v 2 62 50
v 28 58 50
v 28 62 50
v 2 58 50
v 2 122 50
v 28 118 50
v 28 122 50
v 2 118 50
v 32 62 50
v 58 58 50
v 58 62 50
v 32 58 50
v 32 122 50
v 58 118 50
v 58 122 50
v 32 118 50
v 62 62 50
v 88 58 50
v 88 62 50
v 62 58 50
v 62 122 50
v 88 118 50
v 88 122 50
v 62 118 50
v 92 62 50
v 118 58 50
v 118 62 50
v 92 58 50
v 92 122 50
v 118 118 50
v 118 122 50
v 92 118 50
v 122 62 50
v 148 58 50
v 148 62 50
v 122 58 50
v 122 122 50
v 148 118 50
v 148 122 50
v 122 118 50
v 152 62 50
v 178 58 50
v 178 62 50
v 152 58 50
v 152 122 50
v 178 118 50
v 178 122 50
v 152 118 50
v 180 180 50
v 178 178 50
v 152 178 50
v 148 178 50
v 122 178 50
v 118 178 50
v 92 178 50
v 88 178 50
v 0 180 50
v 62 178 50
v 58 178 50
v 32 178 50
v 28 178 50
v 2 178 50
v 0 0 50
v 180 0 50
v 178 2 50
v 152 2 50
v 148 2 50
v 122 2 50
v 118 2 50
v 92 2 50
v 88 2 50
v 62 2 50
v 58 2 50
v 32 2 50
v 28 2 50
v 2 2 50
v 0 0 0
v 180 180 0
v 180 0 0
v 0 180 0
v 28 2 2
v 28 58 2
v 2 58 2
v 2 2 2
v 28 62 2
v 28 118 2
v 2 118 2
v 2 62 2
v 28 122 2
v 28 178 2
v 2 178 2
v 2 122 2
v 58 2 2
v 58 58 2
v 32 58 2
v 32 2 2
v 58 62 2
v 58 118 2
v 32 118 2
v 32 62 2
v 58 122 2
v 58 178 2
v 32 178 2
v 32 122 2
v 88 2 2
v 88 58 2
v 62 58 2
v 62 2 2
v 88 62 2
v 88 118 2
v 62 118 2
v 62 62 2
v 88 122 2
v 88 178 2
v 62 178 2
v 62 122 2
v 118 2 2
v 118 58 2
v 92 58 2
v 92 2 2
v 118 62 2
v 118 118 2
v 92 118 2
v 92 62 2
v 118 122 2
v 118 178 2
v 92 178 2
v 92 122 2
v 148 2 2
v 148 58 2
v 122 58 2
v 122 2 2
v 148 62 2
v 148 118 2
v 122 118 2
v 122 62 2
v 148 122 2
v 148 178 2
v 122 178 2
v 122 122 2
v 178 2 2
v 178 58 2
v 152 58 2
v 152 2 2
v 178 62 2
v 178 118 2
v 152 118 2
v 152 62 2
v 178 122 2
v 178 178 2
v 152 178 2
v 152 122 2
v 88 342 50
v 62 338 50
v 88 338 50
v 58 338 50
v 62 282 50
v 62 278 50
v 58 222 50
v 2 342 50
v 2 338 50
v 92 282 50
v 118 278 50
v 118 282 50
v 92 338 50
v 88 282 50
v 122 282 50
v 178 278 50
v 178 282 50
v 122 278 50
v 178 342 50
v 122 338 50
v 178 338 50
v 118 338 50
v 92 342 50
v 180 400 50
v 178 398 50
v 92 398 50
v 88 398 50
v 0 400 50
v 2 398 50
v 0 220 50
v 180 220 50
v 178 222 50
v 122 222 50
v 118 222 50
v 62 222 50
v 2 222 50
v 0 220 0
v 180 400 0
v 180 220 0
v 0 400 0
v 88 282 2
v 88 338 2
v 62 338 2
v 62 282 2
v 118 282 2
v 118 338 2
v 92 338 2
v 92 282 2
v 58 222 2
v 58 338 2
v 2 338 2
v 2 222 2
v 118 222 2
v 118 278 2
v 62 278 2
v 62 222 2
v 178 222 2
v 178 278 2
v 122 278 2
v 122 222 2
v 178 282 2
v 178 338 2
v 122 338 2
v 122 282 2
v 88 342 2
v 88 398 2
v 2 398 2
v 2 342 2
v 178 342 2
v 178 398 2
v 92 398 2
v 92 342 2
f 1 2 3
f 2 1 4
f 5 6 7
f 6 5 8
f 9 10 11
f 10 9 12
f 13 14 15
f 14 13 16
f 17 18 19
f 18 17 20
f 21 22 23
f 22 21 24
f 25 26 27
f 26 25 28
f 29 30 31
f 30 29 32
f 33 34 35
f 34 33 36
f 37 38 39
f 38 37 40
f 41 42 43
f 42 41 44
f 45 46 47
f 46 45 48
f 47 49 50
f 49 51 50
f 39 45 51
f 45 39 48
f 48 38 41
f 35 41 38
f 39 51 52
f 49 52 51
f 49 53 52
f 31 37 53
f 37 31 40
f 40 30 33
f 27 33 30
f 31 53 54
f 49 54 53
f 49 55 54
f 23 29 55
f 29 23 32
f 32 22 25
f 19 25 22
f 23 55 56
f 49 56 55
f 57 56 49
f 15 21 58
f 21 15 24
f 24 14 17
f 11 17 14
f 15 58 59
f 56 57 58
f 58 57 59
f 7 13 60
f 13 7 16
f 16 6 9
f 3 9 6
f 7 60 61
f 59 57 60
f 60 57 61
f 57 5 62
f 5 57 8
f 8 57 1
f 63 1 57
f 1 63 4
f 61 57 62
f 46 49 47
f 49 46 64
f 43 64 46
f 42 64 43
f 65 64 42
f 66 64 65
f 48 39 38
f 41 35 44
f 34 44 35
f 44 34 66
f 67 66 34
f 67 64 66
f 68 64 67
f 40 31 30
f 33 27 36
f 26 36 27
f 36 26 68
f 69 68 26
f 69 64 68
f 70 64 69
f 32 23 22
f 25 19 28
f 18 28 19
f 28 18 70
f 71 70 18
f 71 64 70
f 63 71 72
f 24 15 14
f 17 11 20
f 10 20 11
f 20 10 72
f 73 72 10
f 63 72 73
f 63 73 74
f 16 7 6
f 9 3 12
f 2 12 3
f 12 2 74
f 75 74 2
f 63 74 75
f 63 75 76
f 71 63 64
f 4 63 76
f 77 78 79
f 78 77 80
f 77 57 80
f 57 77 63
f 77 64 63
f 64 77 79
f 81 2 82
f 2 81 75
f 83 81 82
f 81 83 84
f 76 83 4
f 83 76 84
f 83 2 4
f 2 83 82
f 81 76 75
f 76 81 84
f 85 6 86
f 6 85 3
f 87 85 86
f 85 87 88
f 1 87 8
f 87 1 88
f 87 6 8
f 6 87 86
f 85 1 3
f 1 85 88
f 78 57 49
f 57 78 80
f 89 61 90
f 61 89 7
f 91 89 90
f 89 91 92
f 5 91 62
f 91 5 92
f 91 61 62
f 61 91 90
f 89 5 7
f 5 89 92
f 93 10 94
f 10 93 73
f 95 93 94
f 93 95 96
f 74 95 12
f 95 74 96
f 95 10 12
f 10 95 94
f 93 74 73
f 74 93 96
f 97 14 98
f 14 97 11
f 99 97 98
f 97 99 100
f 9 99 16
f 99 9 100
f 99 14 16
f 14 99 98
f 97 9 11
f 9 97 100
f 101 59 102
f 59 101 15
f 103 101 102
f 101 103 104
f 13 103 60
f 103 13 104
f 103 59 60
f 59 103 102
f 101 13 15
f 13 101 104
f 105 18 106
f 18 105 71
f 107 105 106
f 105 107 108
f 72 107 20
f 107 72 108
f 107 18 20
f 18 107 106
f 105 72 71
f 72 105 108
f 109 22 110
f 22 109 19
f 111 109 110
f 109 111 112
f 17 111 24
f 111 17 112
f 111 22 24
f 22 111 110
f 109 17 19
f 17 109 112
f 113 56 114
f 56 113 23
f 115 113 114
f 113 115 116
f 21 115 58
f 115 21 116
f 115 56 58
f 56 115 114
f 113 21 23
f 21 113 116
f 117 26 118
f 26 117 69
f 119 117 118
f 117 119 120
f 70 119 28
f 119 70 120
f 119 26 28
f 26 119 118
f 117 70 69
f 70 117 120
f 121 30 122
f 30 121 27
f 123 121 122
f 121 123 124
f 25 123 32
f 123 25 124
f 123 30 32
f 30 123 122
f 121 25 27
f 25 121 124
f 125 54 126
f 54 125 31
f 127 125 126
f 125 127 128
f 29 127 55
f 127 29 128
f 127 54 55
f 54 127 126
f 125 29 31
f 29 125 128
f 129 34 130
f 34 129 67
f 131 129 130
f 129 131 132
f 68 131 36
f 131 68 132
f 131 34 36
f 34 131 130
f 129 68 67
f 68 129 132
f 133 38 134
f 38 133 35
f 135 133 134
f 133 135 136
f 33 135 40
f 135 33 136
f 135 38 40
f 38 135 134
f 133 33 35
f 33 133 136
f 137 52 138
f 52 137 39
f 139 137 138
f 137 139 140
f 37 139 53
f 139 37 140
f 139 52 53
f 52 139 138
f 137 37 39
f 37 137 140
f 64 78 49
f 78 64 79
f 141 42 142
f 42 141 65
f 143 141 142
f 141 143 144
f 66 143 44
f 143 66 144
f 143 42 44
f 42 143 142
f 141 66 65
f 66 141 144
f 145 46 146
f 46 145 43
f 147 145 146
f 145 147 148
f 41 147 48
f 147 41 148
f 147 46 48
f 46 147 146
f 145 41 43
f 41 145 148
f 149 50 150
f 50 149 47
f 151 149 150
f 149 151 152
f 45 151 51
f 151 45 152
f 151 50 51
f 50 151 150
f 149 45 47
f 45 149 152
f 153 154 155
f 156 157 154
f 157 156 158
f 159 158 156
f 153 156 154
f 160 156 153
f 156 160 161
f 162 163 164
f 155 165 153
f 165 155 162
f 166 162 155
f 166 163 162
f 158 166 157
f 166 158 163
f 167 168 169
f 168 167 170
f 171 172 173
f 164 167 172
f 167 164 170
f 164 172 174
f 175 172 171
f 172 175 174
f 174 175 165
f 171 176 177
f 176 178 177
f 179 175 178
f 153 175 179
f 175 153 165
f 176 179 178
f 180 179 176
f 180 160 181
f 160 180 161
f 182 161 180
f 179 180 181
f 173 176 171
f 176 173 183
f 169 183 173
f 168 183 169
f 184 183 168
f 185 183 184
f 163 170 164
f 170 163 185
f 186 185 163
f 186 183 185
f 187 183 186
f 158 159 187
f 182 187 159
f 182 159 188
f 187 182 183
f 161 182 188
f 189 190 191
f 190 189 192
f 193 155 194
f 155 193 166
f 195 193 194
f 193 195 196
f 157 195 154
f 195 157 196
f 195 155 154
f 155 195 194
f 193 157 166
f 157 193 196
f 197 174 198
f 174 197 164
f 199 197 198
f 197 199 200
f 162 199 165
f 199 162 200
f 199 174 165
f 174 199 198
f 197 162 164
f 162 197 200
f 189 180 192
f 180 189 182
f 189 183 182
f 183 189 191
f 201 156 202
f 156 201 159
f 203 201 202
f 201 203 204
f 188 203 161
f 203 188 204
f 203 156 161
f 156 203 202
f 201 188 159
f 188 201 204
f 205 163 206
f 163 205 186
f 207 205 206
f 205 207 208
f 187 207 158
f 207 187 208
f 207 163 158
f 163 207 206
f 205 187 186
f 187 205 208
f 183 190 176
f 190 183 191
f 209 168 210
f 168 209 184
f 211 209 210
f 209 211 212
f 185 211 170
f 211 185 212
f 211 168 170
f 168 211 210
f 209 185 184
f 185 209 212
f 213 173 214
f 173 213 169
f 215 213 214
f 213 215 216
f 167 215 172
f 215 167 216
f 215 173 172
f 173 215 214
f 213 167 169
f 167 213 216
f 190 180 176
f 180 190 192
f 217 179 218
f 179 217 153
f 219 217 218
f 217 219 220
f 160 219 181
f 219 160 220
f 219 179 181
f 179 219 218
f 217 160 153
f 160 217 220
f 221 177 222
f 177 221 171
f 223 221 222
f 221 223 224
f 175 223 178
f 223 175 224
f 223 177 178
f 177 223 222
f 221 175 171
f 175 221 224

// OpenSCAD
// Não usar BOSL2
// Projeto organizador de gaveta

// Dimensões da gaveta
//x
width = 180;
//z
height = 50;
//y
depth = 180;

// Espessura da gaveta
thickness_wall = 2;

horizontal_qtd_boxes = 6;
vertical_qtd_boxes = 3;

min_box_width = width / horizontal_qtd_boxes;
min_box_depth = depth / vertical_qtd_boxes;
min_box_height = height;

module box(width, depth, height) {
    difference() {
        cube([width, depth, height]);
        translate([thickness_wall, thickness_wall, thickness_wall])
            cube([
                width - 2 * thickness_wall, 
                depth - 2 * thickness_wall, 
                height - thickness_wall
            ]);
    }
}

// organizador comum
for(i = [0:horizontal_qtd_boxes-1]) {
    for(j = [0:vertical_qtd_boxes-1]) {
        translate([i * min_box_width, j * min_box_depth, 0])
            box(min_box_width, min_box_depth, min_box_height);
    }
}

// espaço entre os dois organizadores só para visualização
gap_between_layouts = 40;

// organizador com caixas de tamanhos variados
// cada caixa é definida em unidades da grade: [coluna, linha, colunas_ocupadas, linhas_ocupadas]
// a grade tem horizontal_qtd_boxes colunas x vertical_qtd_boxes linhas,
// então o tamanho total da gaveta continua o mesmo
mixed_boxes = [
    [0, 0, 2, 2], // caixa grande (dobro na largura e na profundidade)
    [2, 0, 2, 1], // dobro só na largura
    [4, 0, 2, 1], // dobro só na largura
    [2, 1, 1, 1], // padrão
    [3, 1, 1, 1], // padrão
    [4, 1, 2, 1], // dobro só na largura
    [0, 2, 3, 1], // triplo na largura
    [3, 2, 3, 1]  // triplo na largura
];

translate([0, depth + gap_between_layouts, 0])
for(b = mixed_boxes) {
    translate([b[0] * min_box_width, b[1] * min_box_depth, 0])
        box(
            b[2] * min_box_width,
            b[3] * min_box_depth,
            min_box_height
        );
}
